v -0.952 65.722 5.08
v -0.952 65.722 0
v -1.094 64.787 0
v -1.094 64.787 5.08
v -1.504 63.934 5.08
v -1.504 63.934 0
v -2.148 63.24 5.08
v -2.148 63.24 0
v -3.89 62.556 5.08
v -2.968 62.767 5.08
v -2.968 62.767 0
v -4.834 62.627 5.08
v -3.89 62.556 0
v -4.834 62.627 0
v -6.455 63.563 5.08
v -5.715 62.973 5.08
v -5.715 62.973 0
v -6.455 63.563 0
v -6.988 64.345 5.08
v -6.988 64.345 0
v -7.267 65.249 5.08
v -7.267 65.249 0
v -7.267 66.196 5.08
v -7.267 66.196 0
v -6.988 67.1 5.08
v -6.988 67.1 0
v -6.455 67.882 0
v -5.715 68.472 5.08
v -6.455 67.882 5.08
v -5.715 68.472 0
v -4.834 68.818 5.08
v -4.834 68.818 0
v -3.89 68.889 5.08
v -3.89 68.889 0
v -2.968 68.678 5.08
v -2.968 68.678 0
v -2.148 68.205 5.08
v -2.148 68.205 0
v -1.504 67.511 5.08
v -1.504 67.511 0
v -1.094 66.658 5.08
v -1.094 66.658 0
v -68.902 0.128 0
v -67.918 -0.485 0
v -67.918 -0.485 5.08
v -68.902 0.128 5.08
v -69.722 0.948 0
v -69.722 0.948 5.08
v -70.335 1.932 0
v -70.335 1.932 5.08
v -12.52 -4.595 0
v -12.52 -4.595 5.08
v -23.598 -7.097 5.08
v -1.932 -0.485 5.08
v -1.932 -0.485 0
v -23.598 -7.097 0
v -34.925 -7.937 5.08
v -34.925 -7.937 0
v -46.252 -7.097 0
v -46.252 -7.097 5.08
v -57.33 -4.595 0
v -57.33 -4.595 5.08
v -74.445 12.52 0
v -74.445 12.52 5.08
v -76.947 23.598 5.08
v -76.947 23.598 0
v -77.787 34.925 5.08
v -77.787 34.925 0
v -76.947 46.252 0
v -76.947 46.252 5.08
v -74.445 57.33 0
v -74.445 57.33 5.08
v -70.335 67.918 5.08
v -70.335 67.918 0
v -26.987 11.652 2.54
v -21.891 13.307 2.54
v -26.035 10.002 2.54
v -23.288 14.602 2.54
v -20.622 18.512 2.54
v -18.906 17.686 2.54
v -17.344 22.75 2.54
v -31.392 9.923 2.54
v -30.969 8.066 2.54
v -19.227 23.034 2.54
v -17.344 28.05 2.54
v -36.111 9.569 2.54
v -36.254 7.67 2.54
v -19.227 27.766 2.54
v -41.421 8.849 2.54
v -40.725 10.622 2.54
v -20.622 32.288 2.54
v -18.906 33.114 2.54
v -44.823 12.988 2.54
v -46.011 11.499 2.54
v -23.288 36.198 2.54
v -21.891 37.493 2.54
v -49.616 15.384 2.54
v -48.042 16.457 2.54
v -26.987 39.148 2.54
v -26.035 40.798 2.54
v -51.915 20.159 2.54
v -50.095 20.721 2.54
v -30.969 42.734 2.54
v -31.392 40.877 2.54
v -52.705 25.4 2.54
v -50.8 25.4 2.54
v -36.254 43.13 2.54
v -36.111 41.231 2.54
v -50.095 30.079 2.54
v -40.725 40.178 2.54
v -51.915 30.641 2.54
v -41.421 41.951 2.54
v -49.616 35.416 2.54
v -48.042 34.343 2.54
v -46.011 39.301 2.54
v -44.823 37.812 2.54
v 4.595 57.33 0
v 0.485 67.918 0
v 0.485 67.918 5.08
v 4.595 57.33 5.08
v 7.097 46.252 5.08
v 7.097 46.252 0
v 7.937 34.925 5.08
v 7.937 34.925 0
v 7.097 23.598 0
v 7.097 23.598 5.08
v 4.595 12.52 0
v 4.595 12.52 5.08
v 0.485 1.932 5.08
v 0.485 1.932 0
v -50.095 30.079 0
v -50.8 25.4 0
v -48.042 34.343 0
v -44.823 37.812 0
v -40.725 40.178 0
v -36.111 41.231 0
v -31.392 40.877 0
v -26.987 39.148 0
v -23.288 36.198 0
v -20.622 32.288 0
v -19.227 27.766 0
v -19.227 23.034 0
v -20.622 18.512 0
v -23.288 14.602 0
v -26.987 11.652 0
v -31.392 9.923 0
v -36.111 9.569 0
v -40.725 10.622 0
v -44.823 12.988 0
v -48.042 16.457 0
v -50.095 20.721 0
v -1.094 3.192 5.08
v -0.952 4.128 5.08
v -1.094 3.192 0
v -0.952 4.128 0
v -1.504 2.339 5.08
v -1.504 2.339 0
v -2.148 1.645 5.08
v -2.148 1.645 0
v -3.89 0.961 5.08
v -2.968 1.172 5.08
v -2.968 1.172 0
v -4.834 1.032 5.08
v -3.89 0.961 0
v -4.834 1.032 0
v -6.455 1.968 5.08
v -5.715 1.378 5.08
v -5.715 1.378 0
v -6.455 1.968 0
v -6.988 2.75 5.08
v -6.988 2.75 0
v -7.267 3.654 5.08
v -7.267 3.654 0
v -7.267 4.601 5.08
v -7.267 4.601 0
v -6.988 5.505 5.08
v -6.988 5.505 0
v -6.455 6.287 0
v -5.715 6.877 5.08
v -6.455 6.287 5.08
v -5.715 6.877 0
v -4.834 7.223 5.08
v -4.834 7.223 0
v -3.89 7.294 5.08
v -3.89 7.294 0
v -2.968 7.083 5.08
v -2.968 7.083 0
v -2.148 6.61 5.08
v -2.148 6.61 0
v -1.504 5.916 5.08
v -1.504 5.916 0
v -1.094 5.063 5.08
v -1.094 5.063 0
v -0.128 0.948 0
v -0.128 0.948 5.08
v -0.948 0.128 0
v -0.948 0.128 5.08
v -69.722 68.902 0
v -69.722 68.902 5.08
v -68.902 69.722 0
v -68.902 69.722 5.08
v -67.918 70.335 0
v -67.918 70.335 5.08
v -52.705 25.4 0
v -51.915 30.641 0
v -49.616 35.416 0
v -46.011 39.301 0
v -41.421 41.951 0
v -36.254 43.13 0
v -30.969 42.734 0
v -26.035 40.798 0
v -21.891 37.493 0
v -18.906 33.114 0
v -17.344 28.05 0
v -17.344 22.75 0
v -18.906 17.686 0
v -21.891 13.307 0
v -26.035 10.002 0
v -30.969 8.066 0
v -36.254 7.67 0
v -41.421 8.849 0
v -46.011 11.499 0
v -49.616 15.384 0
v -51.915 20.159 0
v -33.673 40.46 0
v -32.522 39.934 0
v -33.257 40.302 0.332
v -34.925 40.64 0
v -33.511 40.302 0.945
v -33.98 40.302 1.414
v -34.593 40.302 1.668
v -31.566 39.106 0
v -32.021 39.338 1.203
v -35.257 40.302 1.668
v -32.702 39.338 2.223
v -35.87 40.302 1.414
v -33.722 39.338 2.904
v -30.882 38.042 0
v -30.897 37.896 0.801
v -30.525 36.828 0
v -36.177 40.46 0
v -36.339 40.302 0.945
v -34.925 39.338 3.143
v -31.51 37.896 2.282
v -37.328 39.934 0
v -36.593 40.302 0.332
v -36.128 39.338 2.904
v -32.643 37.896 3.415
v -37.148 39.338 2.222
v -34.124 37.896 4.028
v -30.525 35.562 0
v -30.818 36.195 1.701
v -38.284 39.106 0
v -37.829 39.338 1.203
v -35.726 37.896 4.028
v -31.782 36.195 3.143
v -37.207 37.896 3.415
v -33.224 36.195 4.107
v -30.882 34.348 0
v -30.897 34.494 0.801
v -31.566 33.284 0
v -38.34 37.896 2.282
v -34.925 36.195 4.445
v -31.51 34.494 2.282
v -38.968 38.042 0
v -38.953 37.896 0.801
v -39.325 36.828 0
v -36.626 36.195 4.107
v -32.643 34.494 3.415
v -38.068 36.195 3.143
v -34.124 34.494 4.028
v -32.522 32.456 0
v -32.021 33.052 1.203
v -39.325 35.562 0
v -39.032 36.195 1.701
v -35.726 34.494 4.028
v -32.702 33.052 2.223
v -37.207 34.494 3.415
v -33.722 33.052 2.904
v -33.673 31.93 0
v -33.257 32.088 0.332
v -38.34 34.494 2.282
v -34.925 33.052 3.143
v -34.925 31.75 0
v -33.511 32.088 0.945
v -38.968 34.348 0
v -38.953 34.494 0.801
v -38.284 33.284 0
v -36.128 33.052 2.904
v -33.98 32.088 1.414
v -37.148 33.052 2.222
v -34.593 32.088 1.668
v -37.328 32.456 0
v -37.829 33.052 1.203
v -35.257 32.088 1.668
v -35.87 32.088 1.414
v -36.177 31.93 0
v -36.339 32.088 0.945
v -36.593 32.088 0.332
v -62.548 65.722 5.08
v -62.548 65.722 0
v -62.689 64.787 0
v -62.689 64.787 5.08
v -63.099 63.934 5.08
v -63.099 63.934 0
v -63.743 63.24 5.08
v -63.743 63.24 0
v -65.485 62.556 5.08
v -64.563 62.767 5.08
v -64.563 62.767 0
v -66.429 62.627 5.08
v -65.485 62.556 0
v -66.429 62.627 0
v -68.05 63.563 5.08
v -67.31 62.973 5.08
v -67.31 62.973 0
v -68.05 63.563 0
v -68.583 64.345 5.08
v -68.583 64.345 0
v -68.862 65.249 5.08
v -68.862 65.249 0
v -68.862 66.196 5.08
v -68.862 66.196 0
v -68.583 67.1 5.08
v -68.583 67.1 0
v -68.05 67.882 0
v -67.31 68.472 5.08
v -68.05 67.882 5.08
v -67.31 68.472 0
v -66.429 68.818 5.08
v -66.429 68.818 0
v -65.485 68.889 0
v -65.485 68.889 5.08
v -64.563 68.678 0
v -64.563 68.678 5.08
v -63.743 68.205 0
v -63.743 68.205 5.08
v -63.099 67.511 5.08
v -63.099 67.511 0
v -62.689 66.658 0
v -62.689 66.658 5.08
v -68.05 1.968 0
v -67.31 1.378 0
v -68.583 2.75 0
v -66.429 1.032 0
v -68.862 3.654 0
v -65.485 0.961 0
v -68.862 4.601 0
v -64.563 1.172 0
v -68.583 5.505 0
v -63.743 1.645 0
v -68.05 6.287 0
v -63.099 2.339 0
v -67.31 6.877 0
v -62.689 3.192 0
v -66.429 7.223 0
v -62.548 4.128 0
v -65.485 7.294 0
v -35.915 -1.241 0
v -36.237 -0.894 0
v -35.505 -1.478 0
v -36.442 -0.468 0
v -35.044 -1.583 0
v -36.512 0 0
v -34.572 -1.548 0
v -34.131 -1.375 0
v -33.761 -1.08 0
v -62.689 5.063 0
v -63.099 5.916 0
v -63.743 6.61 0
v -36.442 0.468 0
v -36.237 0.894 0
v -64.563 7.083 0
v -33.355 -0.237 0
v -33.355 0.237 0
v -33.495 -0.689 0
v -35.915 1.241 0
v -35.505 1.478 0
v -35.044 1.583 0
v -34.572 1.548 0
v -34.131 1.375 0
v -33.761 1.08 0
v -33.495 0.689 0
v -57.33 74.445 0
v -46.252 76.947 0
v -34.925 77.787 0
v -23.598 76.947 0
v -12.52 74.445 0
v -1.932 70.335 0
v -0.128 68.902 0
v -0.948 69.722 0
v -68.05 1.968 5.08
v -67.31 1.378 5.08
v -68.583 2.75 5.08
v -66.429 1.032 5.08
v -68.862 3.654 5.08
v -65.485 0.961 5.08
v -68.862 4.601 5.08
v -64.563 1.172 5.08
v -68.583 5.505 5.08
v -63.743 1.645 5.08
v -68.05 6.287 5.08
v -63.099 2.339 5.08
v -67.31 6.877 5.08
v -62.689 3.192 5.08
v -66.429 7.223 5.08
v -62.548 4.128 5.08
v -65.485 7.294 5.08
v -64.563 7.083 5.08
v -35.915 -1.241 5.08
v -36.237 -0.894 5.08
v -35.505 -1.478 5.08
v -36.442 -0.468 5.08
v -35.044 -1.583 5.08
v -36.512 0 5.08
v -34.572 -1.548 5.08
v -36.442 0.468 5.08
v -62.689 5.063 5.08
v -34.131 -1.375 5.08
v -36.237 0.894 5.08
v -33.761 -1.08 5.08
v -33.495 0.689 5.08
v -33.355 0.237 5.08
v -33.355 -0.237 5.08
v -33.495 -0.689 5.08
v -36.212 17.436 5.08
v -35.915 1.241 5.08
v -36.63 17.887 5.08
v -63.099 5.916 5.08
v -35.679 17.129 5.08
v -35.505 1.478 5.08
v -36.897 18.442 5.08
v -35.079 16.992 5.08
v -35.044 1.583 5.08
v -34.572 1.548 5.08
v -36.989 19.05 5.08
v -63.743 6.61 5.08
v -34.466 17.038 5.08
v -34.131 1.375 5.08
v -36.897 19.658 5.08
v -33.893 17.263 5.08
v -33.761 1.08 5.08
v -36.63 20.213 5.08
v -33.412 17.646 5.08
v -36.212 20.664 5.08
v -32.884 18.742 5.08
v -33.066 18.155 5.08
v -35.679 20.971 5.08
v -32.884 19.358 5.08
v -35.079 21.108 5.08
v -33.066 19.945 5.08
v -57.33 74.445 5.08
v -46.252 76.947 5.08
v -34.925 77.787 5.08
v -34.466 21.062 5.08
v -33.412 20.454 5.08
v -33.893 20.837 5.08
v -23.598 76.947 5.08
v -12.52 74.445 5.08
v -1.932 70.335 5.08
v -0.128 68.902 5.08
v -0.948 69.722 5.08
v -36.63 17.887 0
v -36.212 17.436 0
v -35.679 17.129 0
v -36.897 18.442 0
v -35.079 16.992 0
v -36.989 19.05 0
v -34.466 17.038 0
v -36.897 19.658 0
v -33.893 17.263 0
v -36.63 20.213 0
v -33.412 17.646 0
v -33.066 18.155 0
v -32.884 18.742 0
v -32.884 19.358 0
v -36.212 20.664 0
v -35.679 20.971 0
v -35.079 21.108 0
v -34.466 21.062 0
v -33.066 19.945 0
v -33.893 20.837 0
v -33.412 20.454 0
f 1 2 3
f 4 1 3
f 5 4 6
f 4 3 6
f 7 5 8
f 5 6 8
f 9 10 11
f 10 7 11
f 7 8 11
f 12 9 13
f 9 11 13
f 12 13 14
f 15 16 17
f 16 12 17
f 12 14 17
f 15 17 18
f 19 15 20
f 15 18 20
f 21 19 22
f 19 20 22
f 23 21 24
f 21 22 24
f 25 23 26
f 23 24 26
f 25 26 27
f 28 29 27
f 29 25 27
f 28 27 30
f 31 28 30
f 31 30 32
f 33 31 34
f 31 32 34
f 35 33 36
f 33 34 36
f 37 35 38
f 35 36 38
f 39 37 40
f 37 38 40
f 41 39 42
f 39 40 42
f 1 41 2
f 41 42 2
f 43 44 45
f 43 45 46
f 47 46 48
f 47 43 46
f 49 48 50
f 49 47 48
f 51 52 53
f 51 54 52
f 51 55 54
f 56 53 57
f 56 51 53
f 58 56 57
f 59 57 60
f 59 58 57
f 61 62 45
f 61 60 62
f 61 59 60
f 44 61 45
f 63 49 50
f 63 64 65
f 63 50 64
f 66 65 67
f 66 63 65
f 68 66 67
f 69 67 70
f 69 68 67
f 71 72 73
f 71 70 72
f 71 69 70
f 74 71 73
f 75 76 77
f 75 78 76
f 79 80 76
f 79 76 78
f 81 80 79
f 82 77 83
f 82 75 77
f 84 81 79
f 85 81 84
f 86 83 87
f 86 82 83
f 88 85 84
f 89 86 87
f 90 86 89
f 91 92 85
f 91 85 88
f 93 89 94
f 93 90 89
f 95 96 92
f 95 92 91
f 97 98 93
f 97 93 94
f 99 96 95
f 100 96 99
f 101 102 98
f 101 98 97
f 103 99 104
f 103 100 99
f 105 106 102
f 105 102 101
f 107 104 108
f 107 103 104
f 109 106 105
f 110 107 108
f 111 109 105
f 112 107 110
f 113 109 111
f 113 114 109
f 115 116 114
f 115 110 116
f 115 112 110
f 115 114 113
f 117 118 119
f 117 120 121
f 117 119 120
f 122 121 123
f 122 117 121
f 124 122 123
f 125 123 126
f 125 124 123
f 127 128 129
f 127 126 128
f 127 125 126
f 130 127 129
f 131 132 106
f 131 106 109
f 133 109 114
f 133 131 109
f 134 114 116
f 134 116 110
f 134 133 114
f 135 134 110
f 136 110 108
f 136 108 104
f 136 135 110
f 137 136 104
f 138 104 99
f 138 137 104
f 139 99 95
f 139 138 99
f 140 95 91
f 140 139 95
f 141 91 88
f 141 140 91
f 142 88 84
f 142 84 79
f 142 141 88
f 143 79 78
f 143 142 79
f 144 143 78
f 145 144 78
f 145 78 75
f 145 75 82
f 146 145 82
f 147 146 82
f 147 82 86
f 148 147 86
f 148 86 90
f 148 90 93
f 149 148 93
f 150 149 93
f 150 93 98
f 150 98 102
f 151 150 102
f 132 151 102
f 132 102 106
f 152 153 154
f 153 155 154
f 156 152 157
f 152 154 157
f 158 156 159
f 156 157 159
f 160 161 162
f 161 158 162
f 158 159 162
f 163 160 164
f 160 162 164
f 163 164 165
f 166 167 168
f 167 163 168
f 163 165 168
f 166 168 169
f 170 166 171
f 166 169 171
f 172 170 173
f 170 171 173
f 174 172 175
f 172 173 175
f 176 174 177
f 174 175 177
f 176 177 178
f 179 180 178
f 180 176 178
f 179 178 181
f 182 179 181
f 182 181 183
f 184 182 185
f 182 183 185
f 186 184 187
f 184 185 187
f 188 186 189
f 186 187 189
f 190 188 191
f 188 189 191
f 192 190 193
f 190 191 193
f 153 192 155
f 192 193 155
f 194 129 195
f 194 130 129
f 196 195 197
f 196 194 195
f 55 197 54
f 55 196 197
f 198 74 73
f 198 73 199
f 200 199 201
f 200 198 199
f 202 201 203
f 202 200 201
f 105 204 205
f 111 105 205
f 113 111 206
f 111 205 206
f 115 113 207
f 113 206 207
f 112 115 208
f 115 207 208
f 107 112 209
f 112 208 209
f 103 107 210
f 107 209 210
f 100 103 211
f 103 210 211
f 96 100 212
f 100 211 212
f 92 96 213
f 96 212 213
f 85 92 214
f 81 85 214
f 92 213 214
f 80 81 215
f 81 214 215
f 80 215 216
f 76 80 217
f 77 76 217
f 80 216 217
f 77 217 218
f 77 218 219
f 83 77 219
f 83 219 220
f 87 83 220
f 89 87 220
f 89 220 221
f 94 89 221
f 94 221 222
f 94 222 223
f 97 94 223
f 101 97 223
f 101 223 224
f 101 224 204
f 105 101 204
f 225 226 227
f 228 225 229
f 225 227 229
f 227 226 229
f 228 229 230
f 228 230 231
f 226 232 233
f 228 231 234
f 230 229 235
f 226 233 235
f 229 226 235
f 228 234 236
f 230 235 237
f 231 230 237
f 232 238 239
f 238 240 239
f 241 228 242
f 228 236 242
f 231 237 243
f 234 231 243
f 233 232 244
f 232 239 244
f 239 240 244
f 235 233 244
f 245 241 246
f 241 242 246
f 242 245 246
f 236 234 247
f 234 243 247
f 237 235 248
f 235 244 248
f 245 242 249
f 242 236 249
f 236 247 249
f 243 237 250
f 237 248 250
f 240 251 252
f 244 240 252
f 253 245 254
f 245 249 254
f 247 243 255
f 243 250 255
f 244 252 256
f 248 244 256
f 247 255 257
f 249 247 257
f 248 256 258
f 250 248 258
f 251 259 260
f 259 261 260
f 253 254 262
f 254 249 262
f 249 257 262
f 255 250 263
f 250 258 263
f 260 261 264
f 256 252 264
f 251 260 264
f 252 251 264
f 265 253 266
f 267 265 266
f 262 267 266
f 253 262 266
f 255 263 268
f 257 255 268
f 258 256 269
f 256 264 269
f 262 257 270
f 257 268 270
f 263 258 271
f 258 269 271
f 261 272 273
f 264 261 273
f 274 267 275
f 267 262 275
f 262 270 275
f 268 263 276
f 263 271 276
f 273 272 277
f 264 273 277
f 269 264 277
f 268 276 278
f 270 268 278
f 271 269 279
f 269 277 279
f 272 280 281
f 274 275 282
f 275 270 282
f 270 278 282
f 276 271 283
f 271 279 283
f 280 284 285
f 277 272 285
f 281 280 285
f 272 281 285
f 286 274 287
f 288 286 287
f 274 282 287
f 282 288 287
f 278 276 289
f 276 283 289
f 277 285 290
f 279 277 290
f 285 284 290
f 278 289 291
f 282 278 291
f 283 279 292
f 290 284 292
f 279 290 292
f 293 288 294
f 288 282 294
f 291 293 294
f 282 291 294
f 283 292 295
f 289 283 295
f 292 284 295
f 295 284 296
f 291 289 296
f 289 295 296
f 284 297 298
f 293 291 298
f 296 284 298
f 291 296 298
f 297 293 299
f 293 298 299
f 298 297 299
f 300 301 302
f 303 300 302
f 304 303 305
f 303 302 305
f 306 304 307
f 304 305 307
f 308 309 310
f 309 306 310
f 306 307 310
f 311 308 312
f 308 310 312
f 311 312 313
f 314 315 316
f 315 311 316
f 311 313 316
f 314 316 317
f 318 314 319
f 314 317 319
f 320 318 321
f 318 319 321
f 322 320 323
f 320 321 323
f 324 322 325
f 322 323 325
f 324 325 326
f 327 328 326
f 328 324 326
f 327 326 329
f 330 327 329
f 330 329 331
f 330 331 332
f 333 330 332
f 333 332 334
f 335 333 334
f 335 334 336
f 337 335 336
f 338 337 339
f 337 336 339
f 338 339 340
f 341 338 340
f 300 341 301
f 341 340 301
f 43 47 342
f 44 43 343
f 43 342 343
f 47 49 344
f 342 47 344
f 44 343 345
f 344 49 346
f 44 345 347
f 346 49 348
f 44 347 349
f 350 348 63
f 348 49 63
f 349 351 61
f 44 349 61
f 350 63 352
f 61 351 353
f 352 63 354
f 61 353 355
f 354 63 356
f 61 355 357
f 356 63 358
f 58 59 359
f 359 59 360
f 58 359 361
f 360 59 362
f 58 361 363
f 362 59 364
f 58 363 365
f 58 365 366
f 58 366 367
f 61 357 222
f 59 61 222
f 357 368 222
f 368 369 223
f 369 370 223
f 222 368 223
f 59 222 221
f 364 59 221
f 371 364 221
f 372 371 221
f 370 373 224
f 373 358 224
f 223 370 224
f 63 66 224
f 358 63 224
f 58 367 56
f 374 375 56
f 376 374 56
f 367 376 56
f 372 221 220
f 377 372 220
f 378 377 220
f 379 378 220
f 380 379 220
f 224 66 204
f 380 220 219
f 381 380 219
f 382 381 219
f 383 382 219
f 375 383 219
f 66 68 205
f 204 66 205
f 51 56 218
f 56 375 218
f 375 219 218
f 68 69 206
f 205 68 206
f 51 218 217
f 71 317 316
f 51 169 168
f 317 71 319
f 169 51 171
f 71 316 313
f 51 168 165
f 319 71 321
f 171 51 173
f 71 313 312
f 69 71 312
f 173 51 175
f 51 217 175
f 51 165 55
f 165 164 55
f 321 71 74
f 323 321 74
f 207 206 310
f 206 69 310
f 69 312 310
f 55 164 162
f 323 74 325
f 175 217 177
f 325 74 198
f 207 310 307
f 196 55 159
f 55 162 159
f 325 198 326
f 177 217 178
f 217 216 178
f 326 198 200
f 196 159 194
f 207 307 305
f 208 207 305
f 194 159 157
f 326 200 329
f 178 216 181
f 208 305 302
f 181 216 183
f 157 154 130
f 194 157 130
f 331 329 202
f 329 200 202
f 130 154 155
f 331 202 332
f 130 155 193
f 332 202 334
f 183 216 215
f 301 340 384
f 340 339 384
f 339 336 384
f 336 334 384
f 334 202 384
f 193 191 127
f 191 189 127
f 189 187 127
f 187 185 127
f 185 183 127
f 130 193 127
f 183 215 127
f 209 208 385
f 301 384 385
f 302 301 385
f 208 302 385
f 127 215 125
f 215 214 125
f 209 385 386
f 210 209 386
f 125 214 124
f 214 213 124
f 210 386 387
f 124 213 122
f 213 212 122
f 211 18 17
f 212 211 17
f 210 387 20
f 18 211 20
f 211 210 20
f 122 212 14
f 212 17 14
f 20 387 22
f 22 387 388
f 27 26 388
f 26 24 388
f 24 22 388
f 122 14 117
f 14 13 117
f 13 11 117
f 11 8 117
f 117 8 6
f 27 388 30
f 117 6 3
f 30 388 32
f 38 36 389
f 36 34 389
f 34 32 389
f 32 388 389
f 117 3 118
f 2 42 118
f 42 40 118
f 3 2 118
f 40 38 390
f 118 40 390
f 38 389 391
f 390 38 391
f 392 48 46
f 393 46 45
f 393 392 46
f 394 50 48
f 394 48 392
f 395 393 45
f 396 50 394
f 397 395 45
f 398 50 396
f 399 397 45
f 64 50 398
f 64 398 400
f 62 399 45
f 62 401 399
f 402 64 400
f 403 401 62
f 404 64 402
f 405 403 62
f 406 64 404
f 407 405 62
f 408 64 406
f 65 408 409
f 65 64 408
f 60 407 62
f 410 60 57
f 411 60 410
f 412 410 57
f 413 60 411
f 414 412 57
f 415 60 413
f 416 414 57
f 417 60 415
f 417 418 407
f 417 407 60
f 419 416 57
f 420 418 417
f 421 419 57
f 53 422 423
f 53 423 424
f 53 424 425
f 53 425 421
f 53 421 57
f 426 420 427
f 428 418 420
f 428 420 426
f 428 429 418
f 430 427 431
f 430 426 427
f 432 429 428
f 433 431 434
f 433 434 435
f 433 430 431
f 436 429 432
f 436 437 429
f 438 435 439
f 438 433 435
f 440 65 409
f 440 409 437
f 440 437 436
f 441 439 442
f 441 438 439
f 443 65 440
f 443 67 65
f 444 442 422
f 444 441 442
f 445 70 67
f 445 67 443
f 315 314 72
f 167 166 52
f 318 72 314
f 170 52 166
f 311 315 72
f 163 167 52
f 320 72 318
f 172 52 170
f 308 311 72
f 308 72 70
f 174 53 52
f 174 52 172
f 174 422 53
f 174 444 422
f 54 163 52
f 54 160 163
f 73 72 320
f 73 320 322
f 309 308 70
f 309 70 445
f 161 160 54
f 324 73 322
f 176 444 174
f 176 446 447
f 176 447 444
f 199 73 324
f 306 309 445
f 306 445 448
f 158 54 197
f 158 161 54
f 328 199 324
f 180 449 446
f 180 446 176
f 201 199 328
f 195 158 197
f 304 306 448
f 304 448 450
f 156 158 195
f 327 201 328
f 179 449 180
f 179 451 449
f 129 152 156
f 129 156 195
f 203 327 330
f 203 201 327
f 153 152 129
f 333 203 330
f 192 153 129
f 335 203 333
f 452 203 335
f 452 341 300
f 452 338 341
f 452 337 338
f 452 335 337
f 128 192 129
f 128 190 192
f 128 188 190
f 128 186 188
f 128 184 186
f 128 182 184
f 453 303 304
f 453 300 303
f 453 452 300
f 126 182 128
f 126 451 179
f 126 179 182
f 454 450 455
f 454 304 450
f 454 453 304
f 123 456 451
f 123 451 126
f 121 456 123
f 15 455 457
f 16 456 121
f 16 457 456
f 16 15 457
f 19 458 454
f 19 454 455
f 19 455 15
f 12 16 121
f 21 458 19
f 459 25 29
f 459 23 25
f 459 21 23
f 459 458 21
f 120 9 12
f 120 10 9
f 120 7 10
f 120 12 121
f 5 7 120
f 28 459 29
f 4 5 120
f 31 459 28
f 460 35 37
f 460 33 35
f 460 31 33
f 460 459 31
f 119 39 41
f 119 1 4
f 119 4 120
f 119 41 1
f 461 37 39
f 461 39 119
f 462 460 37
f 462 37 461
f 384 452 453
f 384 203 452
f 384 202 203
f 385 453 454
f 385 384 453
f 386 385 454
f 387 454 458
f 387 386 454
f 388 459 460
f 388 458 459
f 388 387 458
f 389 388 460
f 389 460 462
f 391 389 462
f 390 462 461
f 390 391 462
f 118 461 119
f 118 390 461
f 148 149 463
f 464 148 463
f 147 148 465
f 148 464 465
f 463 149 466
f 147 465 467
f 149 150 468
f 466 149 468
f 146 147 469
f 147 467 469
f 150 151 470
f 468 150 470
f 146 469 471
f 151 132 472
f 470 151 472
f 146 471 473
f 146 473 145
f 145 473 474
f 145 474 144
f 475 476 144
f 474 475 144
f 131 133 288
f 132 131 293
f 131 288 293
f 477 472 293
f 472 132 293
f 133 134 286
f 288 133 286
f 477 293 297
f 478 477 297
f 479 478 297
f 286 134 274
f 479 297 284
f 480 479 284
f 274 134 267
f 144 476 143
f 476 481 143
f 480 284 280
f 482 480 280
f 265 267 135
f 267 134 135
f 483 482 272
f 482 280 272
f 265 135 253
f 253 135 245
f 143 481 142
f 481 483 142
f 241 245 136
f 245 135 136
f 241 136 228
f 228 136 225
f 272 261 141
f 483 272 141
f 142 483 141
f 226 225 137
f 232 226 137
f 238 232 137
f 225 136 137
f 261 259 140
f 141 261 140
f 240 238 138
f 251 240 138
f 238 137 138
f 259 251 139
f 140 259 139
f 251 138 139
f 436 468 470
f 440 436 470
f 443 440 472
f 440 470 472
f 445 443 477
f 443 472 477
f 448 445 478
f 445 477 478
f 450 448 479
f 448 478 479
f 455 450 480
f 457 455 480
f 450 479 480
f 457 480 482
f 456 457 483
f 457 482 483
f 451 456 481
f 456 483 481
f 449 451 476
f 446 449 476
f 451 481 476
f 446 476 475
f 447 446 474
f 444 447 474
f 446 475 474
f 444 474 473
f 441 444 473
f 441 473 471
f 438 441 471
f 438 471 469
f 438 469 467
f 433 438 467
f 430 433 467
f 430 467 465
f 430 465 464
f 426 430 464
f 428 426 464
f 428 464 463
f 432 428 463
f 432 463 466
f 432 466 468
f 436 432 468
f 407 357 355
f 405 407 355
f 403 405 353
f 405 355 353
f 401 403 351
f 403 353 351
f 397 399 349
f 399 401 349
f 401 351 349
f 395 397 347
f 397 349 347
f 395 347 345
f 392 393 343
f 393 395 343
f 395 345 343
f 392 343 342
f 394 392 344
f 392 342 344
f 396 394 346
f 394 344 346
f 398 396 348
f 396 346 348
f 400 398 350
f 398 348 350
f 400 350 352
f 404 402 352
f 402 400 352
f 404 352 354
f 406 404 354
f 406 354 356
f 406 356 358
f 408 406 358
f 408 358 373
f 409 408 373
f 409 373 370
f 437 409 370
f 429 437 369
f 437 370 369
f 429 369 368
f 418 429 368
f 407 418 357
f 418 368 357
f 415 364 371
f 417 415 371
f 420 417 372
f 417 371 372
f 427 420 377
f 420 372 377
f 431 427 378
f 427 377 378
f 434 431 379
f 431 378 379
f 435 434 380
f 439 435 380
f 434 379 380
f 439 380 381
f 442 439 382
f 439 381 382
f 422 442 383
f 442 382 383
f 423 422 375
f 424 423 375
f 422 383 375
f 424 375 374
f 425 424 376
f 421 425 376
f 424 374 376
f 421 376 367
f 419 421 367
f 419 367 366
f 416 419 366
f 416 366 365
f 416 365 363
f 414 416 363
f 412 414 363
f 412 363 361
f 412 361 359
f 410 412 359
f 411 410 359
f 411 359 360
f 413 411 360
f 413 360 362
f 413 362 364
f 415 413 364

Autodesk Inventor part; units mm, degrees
ref_plane "YZ Plane" through (0, 0, 0) normal (1, 0, 0) x (0, 1, 0)
ref_plane "XZ Plane" through (0, 0, 0) normal (0, 1, 0) x (-1, 0, 0)
ref_plane "XY Plane" through (0, 0, 0) normal (0, 0, 1) x (1, 0, 0)
sketch "Sketch1" plane through (0, 0, 0) normal (0, 0, 1) x (1, 0, 0)
  circle A0 centre (-65.7225, 65.7225) radius 3.175
  circle A1 centre (-4.1275, 65.7225) radius 3.175
  circle A2 centre (-4.1275, 4.1275) radius 3.175
  circle A3 centre (-65.7225, 4.1275) radius 3.175
  arc A4 (-67.9183, -0.4854) -> (-1.9317, -0.4854) centre (-34.925, 68.8257) ccw
  arc A5 (-1.9317, 70.3354) -> (-67.9183, 70.3354) centre (-34.925, 1.0243) ccw
  arc A6 (-70.3354, 67.9183) -> (-70.3354, 1.9317) centre (-1.0243, 34.925) ccw
  arc A7 (0.4854, 1.9317) -> (0.4854, 67.9183) centre (-68.8257, 34.925) ccw
  circle A8 centre (-65.7225, 65.7225) radius 5.1089
  circle A9 centre (-4.1275, 65.7225) radius 5.1089
  circle A10 centre (-65.7225, 4.1275) radius 5.1089
  circle A11 centre (-4.1275, 4.1275) radius 5.1089
  arc A12 (-69.85, 62.7118) -> (-69.85, 7.1382) centre (-1.0243, 34.925) ccw
  arc A13 (-7.1382, 69.85) -> (-62.7118, 69.85) centre (-34.925, 1.0243) ccw
  arc A14 (0, 7.1382) -> (0, 62.7118) centre (-68.8257, 34.925) ccw
  arc A15 (-62.7118, 0) -> (-7.1382, 0) centre (-34.925, 68.8257) ccw
  point P0 (0, 0)
  point P1 (-34.925, 77.7875)
  point P2 (-34.925, -7.9375)
  point P3 (-77.7875, 34.925)
  point P4 (7.9375, 34.925)
  point P5 (-34.925, 77.7875)
  point P6 (-34.925, -7.9375)
  dimension "d36" = 6.35
  dimension "d37" = 61.595
  dimension "d38" = 61.595
  dimension "d39" = 85.725
  dimension "d40" = 2.54
  dimension "d41" = 2.54
  dimension "d42" = 2.54
  dimension "d43" = 2.54
  dimension "d44" = 67.8014
  dimension "d45" = 67.8014
extrude "Extrusion1" add sketch "Sketch1" along normal blind 5.08
sketch "Sketch2" plane through (0, 0, 0) normal (0, 0, -1) x (-1, 0, 0)
  circle A0 centre (34.925, 25.4) radius 17.78
  circle A1 centre (34.925, 25.4) radius 15.875
  circle A2 centre (34.925, 19.05) radius 2.0638
  circle A3 centre (34.925, 0) radius 1.5875
  circle A4 centre (34.925, 36.195) radius 4.445
  line L0 (34.925, 40.64) -> (34.925, 31.75)
  circle A5 centre (4.1275, 4.1275) radius 3.175 projected
  circle A6 centre (65.7225, 4.1275) radius 3.175 projected
  circle A7 centre (4.1275, 65.7225) radius 3.175 projected
  circle A8 centre (65.7225, 65.7225) radius 3.175 projected
  arc A9 (1.9317, -0.4854) -> (67.9183, -0.4854) centre (34.925, 68.8257) ccw projected
  arc A10 (67.9183, -0.4854) -> (70.3354, 1.9317) centre (65.7225, 4.1275) ccw projected
  arc A11 (70.3354, 1.9317) -> (70.3354, 67.9183) centre (1.0243, 34.925) ccw projected
  arc A12 (70.3354, 67.9183) -> (67.9183, 70.3354) centre (65.7225, 65.7225) ccw projected
  arc A13 (67.9183, 70.3354) -> (1.9317, 70.3354) centre (34.925, 1.0243) ccw projected
  arc A14 (1.9317, 70.3354) -> (-0.4854, 67.9183) centre (4.1275, 65.7225) ccw projected
  arc A15 (-0.4854, 67.9183) -> (-0.4854, 1.9317) centre (68.8257, 34.925) ccw projected
  arc A16 (-0.4854, 1.9317) -> (1.9317, -0.4854) centre (4.1275, 4.1275) ccw projected
  line L1 (50.8794, 25.4) -> (50.8794, 6.1059) projected
  arc A17 (50.8794, 25.4) -> (18.9706, 25.4) centre (34.925, 25.4) ccw projected
  line L2 (18.9706, 6.1059) -> (18.9706, 25.4) projected
  spline S0 degree 3 poles (14.9225, 8.7528) (15.0016, 8.6923) (15.081, 8.6322) (15.1606, 8.5725) (15.5075, 8.3124) (15.8596, 8.059) (16.5735, 7.5663) (16.9354, 7.3271) (17.3017, 7.0951) (17.668, 6.8631) (18.039, 6.6383) (18.5987, 6.3141) (18.7842, 6.2091) (18.9706, 6.1059) knots -0.55013 -0.55013 -0.55013 -0.55013 -0.52027 -0.52027 -0.52027 -0.390203 -0.390203 -0.260135 -0.260135 -0.260135 -0.130068 -0.130068 -0.066158 -0.066158 -0.066158 -0.066158 projected
  line L3 (14.9225, 8.7528) -> (14.9225, 25.4) projected
  arc A18 (54.9275, 25.4) -> (14.9225, 25.4) centre (34.925, 25.4) ccw projected
  line L4 (54.9275, 25.4) -> (54.9275, 8.7528) projected
  spline S1 degree 3 poles (50.8794, 6.1059) (51.0658, 6.2091) (51.2512, 6.3141) (51.811, 6.6383) (52.182, 6.8631) (52.5483, 7.0951) (52.9146, 7.3271) (53.2764, 7.5663) (53.9904, 8.059) (54.3425, 8.3124) (54.6894, 8.5725) (54.769, 8.6322) (54.8484, 8.6923) (54.9275, 8.7528) knots -0.454112 -0.454112 -0.454112 -0.454112 -0.390203 -0.390203 -0.260135 -0.260135 -0.260135 -0.130068 -0.130068 0 0 0 0.029861 0.029861 0.029861 0.029861 projected
  point P0 (34.925, 36.195)
  dimension "d10" = 1.905
  dimension "d11" = 35.56
  dimension "d15" = 4.1275
  dimension "d18" = 3.175
  dimension "d19" = 19.05
  dimension "d21" = 17.145
  dimension "d22" = 8.89
  dimension "d46" = 10.795
  dimension "d47" = 6.35
extrude "Extrusion2" cut sketch "Sketch2" against normal blind 2.54 contours A0 L1 A17 L2 | L2 A17 L1 A0
extrude "Extrusion3" cut sketch "Sketch2" along normal through all both and the other way through all contours A2 | A3
revolve "Revolution1" cut sketch "Sketch2" angle 360 about axis through (-34.925, 40.64, 0) along (0, -1, 0) picked at (34.5704, 34.7564) contours L0 A4
properties part number "Between Seal 1764"
